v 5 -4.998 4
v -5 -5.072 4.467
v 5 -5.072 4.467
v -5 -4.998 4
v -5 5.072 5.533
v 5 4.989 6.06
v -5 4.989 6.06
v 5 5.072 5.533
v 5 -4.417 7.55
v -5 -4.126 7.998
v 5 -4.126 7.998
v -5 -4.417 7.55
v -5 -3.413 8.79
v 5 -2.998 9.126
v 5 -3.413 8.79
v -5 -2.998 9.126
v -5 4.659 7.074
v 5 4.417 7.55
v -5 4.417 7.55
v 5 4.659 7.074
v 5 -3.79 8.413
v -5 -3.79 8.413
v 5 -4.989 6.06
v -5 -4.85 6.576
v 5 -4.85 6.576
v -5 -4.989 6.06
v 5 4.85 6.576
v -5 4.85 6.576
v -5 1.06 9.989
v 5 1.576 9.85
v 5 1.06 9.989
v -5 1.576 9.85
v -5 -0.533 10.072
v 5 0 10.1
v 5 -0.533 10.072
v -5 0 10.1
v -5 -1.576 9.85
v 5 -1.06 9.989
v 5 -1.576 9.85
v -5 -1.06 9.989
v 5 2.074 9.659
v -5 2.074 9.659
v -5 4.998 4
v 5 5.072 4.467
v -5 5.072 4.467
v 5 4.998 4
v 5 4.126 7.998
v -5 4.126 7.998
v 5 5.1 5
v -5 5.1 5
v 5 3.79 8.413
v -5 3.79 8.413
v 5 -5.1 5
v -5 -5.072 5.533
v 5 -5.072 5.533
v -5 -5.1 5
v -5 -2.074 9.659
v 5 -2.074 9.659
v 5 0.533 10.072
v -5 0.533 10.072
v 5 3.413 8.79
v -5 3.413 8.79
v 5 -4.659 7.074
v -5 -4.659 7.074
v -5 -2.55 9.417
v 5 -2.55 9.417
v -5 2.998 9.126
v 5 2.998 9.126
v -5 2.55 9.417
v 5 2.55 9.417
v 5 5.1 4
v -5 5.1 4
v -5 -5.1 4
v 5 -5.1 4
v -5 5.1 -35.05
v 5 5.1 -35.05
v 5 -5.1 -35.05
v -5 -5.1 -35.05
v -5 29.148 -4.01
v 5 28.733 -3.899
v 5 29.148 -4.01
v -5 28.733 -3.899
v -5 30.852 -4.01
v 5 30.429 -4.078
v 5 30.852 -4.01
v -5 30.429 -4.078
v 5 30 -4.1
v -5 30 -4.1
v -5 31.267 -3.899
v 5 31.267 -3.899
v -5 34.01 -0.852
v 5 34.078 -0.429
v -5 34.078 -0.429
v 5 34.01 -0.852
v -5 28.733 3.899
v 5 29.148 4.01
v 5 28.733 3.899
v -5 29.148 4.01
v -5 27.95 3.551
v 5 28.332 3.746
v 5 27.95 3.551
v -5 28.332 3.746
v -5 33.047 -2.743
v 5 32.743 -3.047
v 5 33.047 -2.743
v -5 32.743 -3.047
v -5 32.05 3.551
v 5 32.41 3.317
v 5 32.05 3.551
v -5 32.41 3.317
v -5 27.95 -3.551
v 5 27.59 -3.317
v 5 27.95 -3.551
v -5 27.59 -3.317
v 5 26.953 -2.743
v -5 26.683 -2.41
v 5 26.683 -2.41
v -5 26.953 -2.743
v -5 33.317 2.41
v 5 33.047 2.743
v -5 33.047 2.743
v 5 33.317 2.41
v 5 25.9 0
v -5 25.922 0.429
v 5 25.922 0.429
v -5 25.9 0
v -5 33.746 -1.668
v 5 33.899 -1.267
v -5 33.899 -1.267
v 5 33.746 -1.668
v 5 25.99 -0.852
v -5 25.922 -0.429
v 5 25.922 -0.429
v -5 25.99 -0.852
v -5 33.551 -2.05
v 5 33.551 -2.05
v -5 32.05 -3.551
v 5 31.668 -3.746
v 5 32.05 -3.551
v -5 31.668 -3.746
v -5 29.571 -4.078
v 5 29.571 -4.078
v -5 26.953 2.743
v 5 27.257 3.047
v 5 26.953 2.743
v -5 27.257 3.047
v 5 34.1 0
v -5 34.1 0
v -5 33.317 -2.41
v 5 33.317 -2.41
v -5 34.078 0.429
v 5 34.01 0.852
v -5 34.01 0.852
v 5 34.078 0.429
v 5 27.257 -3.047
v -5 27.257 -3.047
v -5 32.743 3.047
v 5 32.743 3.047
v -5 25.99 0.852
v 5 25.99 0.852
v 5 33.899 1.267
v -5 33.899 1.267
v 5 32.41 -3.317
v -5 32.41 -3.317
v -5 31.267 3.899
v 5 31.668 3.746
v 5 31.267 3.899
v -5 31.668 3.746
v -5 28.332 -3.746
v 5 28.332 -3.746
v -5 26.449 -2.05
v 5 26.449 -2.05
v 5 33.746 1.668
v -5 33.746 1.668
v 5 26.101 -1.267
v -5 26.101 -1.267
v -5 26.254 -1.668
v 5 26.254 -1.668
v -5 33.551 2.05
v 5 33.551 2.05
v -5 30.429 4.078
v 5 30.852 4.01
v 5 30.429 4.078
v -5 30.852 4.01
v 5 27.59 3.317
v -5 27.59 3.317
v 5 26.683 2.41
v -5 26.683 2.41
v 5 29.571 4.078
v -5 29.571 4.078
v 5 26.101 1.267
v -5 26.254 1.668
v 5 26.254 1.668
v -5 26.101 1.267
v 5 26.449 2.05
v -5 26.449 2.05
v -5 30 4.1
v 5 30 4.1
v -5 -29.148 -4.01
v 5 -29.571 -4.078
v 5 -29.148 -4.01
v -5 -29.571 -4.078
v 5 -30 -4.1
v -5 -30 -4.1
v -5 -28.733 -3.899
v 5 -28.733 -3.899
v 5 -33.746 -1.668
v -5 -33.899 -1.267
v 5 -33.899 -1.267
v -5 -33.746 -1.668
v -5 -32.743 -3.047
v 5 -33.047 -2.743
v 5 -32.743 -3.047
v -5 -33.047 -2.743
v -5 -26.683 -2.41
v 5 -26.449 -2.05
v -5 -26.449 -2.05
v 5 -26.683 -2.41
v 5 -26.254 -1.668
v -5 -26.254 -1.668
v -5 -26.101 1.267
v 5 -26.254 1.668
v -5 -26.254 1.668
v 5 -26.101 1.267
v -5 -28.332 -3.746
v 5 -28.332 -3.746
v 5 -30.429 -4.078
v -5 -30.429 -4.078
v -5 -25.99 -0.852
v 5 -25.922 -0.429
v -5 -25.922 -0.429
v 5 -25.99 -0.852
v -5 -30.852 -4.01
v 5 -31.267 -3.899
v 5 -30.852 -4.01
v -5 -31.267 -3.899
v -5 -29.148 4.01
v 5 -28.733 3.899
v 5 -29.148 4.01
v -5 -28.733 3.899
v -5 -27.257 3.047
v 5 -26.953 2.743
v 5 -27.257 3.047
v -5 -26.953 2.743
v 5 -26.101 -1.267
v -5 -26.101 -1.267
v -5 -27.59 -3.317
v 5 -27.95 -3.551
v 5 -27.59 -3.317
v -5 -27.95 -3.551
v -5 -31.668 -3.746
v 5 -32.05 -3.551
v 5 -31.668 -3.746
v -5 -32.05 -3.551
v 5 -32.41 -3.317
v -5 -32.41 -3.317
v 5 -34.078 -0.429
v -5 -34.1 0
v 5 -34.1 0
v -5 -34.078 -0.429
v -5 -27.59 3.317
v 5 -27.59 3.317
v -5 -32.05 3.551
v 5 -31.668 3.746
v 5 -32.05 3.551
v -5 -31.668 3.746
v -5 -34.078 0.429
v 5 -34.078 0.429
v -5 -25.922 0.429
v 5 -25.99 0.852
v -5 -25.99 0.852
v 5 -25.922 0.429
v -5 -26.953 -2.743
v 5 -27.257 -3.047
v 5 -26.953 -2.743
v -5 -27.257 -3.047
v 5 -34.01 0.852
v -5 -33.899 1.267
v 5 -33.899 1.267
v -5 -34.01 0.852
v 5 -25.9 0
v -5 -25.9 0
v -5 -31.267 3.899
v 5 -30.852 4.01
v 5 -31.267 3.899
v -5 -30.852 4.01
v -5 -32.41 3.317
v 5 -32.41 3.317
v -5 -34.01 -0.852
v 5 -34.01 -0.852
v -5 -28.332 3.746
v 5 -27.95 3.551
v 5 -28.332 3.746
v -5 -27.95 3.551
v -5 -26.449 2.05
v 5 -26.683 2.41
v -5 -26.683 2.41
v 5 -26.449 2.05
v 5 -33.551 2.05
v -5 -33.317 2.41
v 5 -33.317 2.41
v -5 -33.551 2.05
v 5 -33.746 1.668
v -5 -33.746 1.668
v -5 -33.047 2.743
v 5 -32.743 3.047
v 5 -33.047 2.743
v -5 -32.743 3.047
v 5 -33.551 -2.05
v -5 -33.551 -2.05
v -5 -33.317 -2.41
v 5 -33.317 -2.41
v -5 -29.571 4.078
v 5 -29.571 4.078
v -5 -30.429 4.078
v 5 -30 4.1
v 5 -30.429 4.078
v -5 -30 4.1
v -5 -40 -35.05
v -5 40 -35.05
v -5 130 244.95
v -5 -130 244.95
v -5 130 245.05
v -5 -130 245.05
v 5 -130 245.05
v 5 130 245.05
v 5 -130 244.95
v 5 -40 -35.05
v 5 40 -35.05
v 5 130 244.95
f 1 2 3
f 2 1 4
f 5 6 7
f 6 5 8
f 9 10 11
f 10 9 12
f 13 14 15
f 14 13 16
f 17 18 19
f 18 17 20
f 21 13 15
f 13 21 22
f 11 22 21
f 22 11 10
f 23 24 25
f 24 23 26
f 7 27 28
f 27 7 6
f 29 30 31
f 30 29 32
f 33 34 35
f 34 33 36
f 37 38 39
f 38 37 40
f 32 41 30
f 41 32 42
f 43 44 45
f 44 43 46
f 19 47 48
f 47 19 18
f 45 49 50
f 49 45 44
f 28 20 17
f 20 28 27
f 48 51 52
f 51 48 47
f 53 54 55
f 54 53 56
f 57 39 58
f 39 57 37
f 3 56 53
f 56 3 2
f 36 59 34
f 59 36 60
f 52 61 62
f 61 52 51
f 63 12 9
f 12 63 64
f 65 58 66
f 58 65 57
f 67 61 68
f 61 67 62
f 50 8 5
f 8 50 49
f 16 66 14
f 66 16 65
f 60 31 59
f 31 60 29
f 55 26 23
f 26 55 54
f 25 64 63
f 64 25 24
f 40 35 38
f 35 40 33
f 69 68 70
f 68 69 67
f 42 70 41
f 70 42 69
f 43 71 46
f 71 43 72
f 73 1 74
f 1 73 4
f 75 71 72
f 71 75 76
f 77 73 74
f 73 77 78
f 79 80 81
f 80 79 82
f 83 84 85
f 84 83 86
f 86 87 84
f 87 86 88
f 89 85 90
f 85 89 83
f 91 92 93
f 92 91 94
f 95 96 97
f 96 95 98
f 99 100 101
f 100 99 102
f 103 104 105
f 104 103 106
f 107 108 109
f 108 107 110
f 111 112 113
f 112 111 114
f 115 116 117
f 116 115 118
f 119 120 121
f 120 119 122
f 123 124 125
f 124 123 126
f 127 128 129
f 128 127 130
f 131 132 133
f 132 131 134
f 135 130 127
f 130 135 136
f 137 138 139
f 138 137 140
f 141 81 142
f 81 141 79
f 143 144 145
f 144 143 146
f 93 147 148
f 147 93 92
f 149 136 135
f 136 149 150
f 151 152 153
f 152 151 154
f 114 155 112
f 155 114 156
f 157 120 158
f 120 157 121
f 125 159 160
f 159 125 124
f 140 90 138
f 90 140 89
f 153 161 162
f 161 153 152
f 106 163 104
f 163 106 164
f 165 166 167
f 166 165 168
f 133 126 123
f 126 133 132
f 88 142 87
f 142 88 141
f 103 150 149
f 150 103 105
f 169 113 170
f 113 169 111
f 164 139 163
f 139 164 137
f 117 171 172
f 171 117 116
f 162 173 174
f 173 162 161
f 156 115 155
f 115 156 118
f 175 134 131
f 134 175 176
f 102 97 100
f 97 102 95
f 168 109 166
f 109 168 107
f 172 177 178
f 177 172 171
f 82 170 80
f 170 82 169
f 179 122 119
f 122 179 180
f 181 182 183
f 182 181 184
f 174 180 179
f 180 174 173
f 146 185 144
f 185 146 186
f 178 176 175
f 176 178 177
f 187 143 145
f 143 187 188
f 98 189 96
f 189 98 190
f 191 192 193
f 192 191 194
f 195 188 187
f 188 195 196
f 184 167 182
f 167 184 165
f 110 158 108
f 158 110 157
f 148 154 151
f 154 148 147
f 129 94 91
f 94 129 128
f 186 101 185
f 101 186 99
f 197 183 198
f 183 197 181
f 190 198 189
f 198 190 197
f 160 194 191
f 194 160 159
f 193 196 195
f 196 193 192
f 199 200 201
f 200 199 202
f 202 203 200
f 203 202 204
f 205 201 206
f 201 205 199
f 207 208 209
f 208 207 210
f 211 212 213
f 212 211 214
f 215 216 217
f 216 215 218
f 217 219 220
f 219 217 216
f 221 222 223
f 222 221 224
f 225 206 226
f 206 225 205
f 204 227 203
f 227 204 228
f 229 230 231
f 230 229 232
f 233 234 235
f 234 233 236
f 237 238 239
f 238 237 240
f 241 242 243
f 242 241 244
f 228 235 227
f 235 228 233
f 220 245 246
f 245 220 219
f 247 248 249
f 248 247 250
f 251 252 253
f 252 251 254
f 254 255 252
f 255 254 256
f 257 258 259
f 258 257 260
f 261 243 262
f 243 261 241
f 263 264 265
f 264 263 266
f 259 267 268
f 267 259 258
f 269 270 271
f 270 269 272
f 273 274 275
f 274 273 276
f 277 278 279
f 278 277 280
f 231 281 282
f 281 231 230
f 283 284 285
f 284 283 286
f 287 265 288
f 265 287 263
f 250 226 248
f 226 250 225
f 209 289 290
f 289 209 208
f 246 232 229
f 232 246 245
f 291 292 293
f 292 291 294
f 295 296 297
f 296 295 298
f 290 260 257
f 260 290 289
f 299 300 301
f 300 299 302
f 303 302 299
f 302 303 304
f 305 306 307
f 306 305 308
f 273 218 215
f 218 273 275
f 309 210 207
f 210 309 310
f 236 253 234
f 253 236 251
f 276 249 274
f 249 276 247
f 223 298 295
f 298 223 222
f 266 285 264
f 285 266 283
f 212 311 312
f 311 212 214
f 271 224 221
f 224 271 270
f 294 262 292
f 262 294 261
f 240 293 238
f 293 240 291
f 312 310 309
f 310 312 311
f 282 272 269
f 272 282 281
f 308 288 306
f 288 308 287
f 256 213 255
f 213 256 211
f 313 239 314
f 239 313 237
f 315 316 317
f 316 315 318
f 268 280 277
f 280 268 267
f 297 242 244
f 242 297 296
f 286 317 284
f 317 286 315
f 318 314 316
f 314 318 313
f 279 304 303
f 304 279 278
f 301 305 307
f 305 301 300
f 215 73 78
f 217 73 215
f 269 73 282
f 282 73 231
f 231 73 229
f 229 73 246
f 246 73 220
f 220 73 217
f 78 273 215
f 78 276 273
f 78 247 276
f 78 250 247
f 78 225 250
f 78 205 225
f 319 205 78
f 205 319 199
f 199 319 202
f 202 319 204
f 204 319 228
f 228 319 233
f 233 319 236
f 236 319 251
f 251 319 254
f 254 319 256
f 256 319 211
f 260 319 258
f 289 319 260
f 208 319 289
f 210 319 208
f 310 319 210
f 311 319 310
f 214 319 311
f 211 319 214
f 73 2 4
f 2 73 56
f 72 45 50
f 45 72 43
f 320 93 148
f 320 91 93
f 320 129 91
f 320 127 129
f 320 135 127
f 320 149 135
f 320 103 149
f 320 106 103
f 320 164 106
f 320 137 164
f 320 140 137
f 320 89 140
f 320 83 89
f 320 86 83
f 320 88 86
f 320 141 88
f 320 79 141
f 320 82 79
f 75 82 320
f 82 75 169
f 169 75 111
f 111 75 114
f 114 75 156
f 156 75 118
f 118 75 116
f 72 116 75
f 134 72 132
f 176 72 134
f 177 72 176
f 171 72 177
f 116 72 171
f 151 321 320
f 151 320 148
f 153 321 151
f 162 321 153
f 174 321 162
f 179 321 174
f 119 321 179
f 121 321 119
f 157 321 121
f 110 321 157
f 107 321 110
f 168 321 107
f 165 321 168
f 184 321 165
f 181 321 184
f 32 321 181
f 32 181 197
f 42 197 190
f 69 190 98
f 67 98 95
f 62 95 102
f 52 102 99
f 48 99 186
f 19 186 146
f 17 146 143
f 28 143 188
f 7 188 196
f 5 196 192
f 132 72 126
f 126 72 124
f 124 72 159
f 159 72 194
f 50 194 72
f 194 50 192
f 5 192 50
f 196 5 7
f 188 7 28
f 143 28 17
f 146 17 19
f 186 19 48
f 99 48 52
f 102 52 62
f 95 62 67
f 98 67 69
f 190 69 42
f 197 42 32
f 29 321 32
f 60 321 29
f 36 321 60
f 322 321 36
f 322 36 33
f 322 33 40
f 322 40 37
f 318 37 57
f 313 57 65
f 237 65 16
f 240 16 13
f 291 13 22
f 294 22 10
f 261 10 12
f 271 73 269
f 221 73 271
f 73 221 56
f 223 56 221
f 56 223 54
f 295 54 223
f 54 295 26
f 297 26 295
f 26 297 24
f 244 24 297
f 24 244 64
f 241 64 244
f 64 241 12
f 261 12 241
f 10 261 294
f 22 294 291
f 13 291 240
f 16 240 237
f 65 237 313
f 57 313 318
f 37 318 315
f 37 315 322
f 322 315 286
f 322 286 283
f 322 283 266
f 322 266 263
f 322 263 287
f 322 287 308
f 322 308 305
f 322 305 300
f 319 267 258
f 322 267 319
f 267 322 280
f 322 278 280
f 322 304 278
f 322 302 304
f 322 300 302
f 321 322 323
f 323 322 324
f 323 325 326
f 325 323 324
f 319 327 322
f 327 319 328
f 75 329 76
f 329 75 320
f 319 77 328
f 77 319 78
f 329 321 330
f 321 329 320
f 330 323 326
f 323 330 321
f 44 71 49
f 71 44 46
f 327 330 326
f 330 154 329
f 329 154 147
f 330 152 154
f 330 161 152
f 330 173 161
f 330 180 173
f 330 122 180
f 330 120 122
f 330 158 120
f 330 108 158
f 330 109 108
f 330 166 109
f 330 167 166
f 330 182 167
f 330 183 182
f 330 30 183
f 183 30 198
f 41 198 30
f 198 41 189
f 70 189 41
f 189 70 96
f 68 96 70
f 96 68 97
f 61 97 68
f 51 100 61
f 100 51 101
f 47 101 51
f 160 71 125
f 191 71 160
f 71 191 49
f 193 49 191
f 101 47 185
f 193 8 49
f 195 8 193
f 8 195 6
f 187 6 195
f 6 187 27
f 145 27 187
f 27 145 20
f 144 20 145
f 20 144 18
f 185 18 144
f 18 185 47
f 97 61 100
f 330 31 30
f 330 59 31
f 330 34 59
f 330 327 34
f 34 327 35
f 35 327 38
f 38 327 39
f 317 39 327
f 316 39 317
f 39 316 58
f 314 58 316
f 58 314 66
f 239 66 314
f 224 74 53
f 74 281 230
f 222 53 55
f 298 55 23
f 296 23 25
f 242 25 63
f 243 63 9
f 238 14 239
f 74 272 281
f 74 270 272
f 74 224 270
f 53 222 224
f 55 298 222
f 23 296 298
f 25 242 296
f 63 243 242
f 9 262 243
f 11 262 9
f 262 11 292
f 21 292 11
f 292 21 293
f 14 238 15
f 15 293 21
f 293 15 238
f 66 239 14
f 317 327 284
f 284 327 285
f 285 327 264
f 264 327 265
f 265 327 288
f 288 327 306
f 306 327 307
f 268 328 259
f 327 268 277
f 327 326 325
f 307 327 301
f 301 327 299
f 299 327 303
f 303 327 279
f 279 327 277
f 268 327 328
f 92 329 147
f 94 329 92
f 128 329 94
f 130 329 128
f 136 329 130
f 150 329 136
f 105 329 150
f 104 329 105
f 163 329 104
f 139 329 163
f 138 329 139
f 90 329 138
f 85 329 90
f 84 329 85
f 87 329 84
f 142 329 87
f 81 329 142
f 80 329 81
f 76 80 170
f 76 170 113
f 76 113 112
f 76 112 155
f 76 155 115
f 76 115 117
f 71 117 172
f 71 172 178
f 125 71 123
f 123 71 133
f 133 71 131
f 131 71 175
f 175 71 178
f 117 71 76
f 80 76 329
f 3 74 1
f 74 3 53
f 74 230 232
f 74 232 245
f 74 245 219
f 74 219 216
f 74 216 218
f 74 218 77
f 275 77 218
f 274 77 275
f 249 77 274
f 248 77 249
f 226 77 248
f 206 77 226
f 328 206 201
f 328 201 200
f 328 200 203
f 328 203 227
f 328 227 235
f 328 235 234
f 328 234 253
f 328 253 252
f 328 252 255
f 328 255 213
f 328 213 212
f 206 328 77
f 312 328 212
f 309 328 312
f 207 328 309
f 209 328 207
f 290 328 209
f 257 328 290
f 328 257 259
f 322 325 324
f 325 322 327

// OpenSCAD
// file: ../config/parameters.scad
// Global Chassis Dimensions
chassis_width = 750;   
chassis_length = 1000;
drill_pattern_widths = [750, 650, 550];
drill_pattern_lengths = [750, 850, 1000];
base_plate_length = 1300;
connect_plate_thick = 10; 

// Beam Profile (Purchased Part)
beam_profile = 40;
beam_thickness = 3;    
beam_length = 1000;

// Upright & Cover
upright_height = 500;
top_side_width = 60;
cover_thick = 5;
cover_clearance = 10;  
cover_overlap = 10;
cover_total_height = 530; 

// Resolution & Preview
$fn = 60; 
exploded_view = false; 
explosion_dist = 150; 

// Motor & Wheel Data
tire_dia = 430;
tire_width = 100;
hub_dia = 160;
hub_width = 140; //specs from Quinder are: Fork width for mounting: 138mm
axle_dia = 10.2; //specs from Quinder are: Mounting hole: max 10.2mm
bolt_dia = 14.2;

// Bracket Geometry
bracket_thick = 10;
side_plate_top_width = tire_width * 2.6;
side_plate_bottom_width = 80;
axle_bottom_dist = 35;


arm_height = (tire_dia / 2) + 30;
inner_width = hub_width;
bracket_total_width = inner_width + (2 * bracket_thick);
bracket_top_z = arm_height + bracket_thick;

// Axle bracket
axle_hex_width = 80;          
axle_hex_height = 40;
axle_hex_straight_part = 25;   
axle_bracket_thickness = 8;    

axle_hole_diameter = 8.2;
axle_hole_distance = 30;

axle_flat_width = axle_dia; // Gebruikt 10.2 uit parameters 
axle_round_dia = bolt_dia;  // Gebruikt 14.2 uit parameters
// main file
include <../config/parameters.scad>

module bracket_side_plate() {
    color("#A0A0A0") {
        difference() {
            hull() { 
                translate([0, 0, arm_height]) 
                    cube([bracket_thick, side_plate_top_width, 0.1], center=true);
                translate([0, 0, -axle_bottom_dist])
                    cube([bracket_thick, side_plate_bottom_width, 0.1], center=true);
            }

            rotate([0, 90, 0]) {
                translate([-5, 0, 0]) 
                    cylinder(d = axle_dia, h = bracket_thick + 2, center = true);
                translate([axle_bottom_dist / 2, 0, 0])
                    cube([axle_bottom_dist + 8, axle_dia, bracket_thick + 2], center = true);
            }

            rotate([0, 90, 0]) {
                translate([0, axle_hole_distance, 0])
                    cylinder(d = axle_hole_diameter, h = bracket_thick + 2, center = true);
                translate([0, -axle_hole_distance, 0])
                    cylinder(d = axle_hole_diameter, h = bracket_thick + 2, center = true);
            }
        }
    }
}

bracket_side_plate();
